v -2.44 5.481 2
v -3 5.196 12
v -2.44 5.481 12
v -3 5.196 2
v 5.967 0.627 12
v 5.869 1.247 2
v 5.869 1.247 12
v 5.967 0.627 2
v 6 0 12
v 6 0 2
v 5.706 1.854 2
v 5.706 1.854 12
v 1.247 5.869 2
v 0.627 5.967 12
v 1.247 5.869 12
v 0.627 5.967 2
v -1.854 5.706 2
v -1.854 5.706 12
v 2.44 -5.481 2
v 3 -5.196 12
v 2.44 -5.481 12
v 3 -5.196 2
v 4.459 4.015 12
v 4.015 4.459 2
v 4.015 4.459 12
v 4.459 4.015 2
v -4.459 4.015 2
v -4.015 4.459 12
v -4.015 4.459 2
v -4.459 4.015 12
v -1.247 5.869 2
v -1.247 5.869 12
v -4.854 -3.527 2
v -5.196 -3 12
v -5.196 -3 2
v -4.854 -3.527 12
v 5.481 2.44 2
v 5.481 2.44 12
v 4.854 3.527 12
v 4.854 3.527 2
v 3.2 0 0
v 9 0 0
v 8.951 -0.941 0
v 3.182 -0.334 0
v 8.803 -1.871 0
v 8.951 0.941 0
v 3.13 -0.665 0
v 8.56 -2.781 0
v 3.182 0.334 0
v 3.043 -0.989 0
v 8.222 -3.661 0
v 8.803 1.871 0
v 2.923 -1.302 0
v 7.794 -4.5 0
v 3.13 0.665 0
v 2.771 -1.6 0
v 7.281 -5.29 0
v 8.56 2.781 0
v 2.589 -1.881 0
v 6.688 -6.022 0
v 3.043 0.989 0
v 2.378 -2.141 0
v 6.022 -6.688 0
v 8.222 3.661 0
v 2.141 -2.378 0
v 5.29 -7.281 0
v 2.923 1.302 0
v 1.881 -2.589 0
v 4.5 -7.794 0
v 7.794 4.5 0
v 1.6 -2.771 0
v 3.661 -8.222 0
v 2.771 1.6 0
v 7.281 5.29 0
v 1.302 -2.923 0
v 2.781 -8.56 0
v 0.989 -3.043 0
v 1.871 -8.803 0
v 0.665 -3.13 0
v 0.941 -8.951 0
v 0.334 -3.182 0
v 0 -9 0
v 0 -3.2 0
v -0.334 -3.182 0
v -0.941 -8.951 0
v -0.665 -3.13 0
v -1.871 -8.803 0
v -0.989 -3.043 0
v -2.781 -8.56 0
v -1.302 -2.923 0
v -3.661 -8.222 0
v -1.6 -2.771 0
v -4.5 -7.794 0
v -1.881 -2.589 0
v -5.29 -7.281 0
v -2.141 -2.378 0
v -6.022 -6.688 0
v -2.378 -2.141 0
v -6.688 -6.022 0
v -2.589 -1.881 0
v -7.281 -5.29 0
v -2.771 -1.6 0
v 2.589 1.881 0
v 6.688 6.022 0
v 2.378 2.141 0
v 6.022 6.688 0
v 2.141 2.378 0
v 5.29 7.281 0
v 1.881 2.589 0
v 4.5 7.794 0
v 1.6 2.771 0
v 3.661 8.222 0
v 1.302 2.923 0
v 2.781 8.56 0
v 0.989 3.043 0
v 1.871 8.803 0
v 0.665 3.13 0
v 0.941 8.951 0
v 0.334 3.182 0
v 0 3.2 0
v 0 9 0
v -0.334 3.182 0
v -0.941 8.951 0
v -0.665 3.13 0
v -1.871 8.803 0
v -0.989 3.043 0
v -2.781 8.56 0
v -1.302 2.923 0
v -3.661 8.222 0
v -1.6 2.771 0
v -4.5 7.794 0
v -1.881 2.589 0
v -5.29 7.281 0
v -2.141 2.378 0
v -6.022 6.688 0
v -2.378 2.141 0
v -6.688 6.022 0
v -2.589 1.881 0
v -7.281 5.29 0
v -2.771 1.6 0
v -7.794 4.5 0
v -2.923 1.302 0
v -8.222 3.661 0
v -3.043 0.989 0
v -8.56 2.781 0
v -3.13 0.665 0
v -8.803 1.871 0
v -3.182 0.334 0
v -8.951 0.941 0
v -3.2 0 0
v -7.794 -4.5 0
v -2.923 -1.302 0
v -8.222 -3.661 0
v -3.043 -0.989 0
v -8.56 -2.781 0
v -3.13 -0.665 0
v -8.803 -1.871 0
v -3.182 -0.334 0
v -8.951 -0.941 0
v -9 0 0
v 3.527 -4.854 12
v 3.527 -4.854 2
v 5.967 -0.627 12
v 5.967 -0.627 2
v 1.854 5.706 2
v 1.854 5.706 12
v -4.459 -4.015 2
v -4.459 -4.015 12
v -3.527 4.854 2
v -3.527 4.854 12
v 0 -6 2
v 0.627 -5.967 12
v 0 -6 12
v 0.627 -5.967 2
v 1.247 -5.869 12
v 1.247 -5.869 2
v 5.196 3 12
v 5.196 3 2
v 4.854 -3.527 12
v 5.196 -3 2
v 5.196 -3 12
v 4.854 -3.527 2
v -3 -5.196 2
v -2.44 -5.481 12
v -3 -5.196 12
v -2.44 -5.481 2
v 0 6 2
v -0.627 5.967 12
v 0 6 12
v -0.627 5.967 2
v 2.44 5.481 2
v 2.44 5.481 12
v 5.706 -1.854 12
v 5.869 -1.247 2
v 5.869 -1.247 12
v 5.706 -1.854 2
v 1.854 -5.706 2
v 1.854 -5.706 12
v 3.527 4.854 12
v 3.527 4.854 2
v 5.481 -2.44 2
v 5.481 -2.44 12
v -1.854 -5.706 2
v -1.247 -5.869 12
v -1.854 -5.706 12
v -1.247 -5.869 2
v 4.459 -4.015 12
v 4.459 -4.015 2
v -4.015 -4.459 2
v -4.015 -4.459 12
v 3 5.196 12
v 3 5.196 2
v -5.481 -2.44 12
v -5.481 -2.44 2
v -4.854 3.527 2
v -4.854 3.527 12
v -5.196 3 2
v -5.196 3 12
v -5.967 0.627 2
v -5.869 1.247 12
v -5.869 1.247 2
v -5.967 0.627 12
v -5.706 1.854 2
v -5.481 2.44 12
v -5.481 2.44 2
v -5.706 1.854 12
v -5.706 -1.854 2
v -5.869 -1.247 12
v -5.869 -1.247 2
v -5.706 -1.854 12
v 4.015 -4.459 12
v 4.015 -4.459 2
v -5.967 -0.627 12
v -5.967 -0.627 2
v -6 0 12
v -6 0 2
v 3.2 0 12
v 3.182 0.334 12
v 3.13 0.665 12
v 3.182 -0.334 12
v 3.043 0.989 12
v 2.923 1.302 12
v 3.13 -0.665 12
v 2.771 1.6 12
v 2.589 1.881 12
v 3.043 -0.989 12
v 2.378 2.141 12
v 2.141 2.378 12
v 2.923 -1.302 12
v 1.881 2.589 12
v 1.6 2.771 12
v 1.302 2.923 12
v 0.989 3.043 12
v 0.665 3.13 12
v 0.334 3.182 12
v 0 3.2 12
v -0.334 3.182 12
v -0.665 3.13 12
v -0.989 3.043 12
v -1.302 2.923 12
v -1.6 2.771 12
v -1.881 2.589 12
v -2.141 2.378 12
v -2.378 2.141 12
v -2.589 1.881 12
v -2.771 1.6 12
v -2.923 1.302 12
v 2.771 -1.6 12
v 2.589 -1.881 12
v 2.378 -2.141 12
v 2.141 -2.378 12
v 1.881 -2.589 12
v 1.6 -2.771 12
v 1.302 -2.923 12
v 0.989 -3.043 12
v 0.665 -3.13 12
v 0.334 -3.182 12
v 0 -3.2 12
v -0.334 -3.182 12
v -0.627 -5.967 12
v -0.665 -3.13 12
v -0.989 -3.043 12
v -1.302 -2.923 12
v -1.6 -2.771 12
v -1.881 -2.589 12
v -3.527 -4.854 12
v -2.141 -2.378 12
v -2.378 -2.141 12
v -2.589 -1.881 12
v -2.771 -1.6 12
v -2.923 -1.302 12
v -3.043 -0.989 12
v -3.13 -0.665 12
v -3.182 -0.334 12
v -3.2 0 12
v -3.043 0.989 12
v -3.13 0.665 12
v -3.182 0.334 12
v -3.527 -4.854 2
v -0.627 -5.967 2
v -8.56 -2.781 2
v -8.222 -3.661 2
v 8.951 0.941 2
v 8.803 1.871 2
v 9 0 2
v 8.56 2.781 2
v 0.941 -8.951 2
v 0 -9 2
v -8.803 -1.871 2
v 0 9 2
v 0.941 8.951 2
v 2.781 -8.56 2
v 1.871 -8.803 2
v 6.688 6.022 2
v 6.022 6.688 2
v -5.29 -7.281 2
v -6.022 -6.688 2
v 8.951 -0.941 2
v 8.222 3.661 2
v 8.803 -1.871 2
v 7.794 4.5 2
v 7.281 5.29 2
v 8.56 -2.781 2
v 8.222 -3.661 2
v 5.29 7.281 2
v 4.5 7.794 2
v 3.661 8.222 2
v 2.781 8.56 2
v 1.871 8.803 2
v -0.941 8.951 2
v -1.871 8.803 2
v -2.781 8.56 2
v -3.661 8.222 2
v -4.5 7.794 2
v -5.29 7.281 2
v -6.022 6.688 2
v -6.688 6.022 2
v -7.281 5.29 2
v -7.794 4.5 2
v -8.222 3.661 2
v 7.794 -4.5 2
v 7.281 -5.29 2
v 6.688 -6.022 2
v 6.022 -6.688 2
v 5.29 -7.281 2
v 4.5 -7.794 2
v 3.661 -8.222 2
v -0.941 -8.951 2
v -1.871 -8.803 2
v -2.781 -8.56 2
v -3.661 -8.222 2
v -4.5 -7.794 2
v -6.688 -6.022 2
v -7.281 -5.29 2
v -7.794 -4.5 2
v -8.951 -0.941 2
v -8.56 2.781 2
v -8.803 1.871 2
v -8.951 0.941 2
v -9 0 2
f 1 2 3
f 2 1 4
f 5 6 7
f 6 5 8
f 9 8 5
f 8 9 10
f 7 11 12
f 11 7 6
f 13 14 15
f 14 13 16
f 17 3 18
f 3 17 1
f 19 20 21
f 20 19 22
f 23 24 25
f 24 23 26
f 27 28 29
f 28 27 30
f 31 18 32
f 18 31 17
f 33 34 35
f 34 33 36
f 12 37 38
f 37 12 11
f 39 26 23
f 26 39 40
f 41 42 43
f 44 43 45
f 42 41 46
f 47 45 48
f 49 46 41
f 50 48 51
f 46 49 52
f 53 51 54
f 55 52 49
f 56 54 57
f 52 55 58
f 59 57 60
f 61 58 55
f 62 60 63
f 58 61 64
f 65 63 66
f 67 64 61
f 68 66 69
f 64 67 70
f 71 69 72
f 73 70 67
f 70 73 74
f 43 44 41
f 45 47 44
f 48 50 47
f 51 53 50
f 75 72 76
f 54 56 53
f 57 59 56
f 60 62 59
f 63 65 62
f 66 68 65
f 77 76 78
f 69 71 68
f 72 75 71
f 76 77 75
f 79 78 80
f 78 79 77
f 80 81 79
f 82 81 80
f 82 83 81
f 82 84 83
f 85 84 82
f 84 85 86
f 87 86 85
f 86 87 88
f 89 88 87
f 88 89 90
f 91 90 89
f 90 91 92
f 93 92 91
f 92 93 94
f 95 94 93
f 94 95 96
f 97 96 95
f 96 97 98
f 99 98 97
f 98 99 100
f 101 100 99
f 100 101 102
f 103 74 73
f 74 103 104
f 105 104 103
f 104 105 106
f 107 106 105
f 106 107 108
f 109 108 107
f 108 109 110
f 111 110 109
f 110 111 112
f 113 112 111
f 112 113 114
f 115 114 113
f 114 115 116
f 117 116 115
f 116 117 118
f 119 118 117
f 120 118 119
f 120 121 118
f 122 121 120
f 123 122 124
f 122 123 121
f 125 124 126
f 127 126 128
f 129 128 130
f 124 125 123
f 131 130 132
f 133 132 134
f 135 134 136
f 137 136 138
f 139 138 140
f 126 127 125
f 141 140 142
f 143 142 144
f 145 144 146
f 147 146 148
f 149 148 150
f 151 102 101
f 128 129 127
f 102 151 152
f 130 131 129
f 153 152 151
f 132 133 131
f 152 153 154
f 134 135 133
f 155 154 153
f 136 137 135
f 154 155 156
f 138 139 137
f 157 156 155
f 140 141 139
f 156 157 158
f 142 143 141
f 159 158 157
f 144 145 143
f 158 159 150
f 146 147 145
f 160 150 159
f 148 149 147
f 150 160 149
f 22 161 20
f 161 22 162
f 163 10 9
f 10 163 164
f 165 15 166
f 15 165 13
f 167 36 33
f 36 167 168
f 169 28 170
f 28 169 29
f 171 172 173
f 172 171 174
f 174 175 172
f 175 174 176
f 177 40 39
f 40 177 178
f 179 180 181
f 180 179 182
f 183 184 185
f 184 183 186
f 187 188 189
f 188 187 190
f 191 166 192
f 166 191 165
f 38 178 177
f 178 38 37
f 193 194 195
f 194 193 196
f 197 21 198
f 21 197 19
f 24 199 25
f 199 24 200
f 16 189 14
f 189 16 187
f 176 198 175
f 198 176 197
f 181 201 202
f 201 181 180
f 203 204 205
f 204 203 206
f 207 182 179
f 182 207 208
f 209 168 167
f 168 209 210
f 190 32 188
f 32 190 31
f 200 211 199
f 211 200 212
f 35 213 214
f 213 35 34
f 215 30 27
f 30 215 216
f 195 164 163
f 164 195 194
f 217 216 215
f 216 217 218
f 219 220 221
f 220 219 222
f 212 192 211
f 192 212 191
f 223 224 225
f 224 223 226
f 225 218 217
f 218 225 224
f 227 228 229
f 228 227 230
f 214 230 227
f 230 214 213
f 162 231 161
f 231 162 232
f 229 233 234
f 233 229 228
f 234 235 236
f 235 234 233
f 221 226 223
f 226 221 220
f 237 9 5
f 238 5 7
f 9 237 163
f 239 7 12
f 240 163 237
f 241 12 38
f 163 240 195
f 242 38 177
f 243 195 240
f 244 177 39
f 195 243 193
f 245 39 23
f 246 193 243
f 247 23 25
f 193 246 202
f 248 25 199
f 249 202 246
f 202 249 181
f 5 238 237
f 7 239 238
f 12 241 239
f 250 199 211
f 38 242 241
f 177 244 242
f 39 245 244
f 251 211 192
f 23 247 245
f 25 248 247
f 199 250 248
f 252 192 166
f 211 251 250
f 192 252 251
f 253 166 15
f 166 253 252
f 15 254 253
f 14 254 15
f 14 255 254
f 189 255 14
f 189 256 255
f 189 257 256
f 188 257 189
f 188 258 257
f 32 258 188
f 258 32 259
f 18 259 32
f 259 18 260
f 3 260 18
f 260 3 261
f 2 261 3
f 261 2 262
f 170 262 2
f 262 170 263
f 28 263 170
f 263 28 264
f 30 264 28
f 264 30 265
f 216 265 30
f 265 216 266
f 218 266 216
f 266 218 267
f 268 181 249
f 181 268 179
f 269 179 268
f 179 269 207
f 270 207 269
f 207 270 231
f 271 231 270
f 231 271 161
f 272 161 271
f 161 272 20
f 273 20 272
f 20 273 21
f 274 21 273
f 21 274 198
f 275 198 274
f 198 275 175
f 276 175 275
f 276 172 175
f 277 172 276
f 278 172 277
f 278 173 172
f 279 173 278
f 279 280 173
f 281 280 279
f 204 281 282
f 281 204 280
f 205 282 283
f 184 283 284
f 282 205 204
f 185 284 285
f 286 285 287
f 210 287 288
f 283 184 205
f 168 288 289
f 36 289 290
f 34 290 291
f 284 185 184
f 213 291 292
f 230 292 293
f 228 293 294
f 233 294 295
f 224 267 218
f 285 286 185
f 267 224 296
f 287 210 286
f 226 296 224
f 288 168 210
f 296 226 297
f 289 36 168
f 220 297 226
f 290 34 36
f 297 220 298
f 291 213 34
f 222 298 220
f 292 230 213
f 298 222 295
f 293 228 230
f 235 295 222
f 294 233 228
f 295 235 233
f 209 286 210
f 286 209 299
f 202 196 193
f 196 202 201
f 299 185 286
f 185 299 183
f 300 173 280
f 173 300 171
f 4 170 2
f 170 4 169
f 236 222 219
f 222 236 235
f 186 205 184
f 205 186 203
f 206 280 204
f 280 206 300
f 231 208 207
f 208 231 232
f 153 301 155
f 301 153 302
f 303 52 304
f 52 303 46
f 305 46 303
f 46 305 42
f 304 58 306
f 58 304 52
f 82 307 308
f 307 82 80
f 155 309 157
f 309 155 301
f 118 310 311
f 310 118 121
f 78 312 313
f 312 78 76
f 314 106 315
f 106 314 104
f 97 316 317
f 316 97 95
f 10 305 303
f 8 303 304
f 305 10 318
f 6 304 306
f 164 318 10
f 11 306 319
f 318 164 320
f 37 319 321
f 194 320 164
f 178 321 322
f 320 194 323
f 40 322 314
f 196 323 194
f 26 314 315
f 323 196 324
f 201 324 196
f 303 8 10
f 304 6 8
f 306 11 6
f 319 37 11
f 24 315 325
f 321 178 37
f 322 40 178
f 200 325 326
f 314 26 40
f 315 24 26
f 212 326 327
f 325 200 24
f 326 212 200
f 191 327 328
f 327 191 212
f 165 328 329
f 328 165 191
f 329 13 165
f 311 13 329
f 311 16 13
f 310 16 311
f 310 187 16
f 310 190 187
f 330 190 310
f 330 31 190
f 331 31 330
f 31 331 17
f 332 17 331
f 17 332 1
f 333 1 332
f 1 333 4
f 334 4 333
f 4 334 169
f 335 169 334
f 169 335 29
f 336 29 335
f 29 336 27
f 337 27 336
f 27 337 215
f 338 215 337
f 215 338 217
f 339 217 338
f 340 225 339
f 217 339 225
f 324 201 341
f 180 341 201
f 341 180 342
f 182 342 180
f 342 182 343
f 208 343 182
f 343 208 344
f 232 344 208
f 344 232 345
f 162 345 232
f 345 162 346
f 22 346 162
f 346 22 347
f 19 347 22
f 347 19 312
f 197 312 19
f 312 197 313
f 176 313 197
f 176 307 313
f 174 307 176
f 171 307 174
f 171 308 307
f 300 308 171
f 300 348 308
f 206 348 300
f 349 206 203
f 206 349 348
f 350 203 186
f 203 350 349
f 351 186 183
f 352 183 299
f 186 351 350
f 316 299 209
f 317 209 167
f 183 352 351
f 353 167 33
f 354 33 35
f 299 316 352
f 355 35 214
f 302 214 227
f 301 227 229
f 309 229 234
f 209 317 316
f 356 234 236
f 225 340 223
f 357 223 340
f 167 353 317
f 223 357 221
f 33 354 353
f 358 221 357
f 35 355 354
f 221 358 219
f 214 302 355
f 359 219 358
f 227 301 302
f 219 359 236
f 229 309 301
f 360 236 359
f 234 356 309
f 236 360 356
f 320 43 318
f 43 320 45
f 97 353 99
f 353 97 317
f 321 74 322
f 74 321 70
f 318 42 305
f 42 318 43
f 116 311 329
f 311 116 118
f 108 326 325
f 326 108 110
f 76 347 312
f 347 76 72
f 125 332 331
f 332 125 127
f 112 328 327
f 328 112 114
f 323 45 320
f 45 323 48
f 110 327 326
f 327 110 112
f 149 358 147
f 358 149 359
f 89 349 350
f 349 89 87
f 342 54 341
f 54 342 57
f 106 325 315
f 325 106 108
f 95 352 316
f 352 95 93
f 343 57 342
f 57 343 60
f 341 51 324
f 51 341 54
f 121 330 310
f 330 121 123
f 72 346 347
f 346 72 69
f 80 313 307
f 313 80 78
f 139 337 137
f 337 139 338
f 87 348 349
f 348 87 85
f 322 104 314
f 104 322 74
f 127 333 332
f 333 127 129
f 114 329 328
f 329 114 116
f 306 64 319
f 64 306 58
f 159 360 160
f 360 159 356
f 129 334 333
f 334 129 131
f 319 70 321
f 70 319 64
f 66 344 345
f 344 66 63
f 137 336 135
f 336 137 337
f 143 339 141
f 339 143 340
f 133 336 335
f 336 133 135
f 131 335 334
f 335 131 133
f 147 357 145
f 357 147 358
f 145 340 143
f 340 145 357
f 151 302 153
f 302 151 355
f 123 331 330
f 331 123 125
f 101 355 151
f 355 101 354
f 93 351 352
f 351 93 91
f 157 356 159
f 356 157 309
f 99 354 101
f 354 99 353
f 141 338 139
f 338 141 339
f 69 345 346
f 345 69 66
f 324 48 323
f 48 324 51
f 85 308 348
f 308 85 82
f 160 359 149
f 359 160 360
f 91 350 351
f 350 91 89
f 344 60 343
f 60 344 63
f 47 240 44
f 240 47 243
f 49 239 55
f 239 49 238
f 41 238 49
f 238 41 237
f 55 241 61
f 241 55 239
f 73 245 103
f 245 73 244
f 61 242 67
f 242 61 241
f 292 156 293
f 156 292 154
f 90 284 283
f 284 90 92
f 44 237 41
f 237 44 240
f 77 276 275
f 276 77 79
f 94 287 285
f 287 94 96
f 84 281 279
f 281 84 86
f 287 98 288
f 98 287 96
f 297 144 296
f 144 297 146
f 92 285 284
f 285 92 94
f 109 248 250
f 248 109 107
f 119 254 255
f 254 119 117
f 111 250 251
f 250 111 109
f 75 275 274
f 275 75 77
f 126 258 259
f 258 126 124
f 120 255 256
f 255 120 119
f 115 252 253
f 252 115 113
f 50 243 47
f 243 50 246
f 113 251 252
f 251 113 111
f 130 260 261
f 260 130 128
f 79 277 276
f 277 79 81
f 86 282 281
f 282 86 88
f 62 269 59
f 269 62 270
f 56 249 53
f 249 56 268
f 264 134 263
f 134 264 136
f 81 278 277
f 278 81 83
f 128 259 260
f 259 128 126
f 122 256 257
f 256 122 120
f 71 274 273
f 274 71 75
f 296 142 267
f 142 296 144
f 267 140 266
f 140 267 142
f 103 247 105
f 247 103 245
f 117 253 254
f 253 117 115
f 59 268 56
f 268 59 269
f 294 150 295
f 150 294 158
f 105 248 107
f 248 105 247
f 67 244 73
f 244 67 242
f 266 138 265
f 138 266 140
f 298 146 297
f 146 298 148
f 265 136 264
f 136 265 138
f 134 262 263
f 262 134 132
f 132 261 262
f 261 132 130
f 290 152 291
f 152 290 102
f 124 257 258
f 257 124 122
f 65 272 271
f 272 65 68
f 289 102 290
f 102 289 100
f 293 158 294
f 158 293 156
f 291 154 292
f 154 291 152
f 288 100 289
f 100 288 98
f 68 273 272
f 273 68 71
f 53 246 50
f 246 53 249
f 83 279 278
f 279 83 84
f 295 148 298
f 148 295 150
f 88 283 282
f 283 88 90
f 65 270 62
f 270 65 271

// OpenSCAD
// Flanged threaded insert.
$fn = 60;
eps = 0.02;
inner_d = 6.4;
outer_d = 12;
length = 12;
flange_d = 18;
difference() {
    union() { cylinder(d=outer_d,h=length); cylinder(d=flange_d,h=2); }
    translate([0,0,-eps]) cylinder(d=inner_d,h=length+2*eps);
}
